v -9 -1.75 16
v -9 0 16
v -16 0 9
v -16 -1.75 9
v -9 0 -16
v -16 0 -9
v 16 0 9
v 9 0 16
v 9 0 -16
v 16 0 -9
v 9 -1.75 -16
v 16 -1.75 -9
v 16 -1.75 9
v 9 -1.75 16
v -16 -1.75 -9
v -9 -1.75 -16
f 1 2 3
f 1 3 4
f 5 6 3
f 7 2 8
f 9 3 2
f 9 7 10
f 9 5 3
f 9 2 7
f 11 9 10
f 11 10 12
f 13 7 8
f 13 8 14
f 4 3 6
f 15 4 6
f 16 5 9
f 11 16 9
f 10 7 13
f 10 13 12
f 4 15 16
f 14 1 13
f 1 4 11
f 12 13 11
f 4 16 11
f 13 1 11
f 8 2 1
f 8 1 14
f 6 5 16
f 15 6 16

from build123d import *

# Parameters (mm, degrees)
SKETCH1_W           = 32
SKETCH1_H           = 32
BOSS_EXTRUDE1_DEPTH = 1.75
CHAMFER1_SIZE       = 7


with BuildPart() as part:
    # Sketch1 → Boss-Extrude1 (new body)
    with BuildSketch(Plane(origin=(0, 0, 0), x_dir=(1, 0, 0), z_dir=(0, 1, 0))):
        Rectangle(SKETCH1_W, SKETCH1_H)
    extrude(amount=-BOSS_EXTRUDE1_DEPTH)

    # Chamfer1
    chamfer1_edges = [part.edges().sort_by_distance(p)[0] for p in [
        (16, -0.875, 16),
        (-16, -0.875, 16),
        (-16, -0.875, -16),
        (16, -0.875, -16),
    ]]
    chamfer(chamfer1_edges, length=CHAMFER1_SIZE)


solid = part.part
